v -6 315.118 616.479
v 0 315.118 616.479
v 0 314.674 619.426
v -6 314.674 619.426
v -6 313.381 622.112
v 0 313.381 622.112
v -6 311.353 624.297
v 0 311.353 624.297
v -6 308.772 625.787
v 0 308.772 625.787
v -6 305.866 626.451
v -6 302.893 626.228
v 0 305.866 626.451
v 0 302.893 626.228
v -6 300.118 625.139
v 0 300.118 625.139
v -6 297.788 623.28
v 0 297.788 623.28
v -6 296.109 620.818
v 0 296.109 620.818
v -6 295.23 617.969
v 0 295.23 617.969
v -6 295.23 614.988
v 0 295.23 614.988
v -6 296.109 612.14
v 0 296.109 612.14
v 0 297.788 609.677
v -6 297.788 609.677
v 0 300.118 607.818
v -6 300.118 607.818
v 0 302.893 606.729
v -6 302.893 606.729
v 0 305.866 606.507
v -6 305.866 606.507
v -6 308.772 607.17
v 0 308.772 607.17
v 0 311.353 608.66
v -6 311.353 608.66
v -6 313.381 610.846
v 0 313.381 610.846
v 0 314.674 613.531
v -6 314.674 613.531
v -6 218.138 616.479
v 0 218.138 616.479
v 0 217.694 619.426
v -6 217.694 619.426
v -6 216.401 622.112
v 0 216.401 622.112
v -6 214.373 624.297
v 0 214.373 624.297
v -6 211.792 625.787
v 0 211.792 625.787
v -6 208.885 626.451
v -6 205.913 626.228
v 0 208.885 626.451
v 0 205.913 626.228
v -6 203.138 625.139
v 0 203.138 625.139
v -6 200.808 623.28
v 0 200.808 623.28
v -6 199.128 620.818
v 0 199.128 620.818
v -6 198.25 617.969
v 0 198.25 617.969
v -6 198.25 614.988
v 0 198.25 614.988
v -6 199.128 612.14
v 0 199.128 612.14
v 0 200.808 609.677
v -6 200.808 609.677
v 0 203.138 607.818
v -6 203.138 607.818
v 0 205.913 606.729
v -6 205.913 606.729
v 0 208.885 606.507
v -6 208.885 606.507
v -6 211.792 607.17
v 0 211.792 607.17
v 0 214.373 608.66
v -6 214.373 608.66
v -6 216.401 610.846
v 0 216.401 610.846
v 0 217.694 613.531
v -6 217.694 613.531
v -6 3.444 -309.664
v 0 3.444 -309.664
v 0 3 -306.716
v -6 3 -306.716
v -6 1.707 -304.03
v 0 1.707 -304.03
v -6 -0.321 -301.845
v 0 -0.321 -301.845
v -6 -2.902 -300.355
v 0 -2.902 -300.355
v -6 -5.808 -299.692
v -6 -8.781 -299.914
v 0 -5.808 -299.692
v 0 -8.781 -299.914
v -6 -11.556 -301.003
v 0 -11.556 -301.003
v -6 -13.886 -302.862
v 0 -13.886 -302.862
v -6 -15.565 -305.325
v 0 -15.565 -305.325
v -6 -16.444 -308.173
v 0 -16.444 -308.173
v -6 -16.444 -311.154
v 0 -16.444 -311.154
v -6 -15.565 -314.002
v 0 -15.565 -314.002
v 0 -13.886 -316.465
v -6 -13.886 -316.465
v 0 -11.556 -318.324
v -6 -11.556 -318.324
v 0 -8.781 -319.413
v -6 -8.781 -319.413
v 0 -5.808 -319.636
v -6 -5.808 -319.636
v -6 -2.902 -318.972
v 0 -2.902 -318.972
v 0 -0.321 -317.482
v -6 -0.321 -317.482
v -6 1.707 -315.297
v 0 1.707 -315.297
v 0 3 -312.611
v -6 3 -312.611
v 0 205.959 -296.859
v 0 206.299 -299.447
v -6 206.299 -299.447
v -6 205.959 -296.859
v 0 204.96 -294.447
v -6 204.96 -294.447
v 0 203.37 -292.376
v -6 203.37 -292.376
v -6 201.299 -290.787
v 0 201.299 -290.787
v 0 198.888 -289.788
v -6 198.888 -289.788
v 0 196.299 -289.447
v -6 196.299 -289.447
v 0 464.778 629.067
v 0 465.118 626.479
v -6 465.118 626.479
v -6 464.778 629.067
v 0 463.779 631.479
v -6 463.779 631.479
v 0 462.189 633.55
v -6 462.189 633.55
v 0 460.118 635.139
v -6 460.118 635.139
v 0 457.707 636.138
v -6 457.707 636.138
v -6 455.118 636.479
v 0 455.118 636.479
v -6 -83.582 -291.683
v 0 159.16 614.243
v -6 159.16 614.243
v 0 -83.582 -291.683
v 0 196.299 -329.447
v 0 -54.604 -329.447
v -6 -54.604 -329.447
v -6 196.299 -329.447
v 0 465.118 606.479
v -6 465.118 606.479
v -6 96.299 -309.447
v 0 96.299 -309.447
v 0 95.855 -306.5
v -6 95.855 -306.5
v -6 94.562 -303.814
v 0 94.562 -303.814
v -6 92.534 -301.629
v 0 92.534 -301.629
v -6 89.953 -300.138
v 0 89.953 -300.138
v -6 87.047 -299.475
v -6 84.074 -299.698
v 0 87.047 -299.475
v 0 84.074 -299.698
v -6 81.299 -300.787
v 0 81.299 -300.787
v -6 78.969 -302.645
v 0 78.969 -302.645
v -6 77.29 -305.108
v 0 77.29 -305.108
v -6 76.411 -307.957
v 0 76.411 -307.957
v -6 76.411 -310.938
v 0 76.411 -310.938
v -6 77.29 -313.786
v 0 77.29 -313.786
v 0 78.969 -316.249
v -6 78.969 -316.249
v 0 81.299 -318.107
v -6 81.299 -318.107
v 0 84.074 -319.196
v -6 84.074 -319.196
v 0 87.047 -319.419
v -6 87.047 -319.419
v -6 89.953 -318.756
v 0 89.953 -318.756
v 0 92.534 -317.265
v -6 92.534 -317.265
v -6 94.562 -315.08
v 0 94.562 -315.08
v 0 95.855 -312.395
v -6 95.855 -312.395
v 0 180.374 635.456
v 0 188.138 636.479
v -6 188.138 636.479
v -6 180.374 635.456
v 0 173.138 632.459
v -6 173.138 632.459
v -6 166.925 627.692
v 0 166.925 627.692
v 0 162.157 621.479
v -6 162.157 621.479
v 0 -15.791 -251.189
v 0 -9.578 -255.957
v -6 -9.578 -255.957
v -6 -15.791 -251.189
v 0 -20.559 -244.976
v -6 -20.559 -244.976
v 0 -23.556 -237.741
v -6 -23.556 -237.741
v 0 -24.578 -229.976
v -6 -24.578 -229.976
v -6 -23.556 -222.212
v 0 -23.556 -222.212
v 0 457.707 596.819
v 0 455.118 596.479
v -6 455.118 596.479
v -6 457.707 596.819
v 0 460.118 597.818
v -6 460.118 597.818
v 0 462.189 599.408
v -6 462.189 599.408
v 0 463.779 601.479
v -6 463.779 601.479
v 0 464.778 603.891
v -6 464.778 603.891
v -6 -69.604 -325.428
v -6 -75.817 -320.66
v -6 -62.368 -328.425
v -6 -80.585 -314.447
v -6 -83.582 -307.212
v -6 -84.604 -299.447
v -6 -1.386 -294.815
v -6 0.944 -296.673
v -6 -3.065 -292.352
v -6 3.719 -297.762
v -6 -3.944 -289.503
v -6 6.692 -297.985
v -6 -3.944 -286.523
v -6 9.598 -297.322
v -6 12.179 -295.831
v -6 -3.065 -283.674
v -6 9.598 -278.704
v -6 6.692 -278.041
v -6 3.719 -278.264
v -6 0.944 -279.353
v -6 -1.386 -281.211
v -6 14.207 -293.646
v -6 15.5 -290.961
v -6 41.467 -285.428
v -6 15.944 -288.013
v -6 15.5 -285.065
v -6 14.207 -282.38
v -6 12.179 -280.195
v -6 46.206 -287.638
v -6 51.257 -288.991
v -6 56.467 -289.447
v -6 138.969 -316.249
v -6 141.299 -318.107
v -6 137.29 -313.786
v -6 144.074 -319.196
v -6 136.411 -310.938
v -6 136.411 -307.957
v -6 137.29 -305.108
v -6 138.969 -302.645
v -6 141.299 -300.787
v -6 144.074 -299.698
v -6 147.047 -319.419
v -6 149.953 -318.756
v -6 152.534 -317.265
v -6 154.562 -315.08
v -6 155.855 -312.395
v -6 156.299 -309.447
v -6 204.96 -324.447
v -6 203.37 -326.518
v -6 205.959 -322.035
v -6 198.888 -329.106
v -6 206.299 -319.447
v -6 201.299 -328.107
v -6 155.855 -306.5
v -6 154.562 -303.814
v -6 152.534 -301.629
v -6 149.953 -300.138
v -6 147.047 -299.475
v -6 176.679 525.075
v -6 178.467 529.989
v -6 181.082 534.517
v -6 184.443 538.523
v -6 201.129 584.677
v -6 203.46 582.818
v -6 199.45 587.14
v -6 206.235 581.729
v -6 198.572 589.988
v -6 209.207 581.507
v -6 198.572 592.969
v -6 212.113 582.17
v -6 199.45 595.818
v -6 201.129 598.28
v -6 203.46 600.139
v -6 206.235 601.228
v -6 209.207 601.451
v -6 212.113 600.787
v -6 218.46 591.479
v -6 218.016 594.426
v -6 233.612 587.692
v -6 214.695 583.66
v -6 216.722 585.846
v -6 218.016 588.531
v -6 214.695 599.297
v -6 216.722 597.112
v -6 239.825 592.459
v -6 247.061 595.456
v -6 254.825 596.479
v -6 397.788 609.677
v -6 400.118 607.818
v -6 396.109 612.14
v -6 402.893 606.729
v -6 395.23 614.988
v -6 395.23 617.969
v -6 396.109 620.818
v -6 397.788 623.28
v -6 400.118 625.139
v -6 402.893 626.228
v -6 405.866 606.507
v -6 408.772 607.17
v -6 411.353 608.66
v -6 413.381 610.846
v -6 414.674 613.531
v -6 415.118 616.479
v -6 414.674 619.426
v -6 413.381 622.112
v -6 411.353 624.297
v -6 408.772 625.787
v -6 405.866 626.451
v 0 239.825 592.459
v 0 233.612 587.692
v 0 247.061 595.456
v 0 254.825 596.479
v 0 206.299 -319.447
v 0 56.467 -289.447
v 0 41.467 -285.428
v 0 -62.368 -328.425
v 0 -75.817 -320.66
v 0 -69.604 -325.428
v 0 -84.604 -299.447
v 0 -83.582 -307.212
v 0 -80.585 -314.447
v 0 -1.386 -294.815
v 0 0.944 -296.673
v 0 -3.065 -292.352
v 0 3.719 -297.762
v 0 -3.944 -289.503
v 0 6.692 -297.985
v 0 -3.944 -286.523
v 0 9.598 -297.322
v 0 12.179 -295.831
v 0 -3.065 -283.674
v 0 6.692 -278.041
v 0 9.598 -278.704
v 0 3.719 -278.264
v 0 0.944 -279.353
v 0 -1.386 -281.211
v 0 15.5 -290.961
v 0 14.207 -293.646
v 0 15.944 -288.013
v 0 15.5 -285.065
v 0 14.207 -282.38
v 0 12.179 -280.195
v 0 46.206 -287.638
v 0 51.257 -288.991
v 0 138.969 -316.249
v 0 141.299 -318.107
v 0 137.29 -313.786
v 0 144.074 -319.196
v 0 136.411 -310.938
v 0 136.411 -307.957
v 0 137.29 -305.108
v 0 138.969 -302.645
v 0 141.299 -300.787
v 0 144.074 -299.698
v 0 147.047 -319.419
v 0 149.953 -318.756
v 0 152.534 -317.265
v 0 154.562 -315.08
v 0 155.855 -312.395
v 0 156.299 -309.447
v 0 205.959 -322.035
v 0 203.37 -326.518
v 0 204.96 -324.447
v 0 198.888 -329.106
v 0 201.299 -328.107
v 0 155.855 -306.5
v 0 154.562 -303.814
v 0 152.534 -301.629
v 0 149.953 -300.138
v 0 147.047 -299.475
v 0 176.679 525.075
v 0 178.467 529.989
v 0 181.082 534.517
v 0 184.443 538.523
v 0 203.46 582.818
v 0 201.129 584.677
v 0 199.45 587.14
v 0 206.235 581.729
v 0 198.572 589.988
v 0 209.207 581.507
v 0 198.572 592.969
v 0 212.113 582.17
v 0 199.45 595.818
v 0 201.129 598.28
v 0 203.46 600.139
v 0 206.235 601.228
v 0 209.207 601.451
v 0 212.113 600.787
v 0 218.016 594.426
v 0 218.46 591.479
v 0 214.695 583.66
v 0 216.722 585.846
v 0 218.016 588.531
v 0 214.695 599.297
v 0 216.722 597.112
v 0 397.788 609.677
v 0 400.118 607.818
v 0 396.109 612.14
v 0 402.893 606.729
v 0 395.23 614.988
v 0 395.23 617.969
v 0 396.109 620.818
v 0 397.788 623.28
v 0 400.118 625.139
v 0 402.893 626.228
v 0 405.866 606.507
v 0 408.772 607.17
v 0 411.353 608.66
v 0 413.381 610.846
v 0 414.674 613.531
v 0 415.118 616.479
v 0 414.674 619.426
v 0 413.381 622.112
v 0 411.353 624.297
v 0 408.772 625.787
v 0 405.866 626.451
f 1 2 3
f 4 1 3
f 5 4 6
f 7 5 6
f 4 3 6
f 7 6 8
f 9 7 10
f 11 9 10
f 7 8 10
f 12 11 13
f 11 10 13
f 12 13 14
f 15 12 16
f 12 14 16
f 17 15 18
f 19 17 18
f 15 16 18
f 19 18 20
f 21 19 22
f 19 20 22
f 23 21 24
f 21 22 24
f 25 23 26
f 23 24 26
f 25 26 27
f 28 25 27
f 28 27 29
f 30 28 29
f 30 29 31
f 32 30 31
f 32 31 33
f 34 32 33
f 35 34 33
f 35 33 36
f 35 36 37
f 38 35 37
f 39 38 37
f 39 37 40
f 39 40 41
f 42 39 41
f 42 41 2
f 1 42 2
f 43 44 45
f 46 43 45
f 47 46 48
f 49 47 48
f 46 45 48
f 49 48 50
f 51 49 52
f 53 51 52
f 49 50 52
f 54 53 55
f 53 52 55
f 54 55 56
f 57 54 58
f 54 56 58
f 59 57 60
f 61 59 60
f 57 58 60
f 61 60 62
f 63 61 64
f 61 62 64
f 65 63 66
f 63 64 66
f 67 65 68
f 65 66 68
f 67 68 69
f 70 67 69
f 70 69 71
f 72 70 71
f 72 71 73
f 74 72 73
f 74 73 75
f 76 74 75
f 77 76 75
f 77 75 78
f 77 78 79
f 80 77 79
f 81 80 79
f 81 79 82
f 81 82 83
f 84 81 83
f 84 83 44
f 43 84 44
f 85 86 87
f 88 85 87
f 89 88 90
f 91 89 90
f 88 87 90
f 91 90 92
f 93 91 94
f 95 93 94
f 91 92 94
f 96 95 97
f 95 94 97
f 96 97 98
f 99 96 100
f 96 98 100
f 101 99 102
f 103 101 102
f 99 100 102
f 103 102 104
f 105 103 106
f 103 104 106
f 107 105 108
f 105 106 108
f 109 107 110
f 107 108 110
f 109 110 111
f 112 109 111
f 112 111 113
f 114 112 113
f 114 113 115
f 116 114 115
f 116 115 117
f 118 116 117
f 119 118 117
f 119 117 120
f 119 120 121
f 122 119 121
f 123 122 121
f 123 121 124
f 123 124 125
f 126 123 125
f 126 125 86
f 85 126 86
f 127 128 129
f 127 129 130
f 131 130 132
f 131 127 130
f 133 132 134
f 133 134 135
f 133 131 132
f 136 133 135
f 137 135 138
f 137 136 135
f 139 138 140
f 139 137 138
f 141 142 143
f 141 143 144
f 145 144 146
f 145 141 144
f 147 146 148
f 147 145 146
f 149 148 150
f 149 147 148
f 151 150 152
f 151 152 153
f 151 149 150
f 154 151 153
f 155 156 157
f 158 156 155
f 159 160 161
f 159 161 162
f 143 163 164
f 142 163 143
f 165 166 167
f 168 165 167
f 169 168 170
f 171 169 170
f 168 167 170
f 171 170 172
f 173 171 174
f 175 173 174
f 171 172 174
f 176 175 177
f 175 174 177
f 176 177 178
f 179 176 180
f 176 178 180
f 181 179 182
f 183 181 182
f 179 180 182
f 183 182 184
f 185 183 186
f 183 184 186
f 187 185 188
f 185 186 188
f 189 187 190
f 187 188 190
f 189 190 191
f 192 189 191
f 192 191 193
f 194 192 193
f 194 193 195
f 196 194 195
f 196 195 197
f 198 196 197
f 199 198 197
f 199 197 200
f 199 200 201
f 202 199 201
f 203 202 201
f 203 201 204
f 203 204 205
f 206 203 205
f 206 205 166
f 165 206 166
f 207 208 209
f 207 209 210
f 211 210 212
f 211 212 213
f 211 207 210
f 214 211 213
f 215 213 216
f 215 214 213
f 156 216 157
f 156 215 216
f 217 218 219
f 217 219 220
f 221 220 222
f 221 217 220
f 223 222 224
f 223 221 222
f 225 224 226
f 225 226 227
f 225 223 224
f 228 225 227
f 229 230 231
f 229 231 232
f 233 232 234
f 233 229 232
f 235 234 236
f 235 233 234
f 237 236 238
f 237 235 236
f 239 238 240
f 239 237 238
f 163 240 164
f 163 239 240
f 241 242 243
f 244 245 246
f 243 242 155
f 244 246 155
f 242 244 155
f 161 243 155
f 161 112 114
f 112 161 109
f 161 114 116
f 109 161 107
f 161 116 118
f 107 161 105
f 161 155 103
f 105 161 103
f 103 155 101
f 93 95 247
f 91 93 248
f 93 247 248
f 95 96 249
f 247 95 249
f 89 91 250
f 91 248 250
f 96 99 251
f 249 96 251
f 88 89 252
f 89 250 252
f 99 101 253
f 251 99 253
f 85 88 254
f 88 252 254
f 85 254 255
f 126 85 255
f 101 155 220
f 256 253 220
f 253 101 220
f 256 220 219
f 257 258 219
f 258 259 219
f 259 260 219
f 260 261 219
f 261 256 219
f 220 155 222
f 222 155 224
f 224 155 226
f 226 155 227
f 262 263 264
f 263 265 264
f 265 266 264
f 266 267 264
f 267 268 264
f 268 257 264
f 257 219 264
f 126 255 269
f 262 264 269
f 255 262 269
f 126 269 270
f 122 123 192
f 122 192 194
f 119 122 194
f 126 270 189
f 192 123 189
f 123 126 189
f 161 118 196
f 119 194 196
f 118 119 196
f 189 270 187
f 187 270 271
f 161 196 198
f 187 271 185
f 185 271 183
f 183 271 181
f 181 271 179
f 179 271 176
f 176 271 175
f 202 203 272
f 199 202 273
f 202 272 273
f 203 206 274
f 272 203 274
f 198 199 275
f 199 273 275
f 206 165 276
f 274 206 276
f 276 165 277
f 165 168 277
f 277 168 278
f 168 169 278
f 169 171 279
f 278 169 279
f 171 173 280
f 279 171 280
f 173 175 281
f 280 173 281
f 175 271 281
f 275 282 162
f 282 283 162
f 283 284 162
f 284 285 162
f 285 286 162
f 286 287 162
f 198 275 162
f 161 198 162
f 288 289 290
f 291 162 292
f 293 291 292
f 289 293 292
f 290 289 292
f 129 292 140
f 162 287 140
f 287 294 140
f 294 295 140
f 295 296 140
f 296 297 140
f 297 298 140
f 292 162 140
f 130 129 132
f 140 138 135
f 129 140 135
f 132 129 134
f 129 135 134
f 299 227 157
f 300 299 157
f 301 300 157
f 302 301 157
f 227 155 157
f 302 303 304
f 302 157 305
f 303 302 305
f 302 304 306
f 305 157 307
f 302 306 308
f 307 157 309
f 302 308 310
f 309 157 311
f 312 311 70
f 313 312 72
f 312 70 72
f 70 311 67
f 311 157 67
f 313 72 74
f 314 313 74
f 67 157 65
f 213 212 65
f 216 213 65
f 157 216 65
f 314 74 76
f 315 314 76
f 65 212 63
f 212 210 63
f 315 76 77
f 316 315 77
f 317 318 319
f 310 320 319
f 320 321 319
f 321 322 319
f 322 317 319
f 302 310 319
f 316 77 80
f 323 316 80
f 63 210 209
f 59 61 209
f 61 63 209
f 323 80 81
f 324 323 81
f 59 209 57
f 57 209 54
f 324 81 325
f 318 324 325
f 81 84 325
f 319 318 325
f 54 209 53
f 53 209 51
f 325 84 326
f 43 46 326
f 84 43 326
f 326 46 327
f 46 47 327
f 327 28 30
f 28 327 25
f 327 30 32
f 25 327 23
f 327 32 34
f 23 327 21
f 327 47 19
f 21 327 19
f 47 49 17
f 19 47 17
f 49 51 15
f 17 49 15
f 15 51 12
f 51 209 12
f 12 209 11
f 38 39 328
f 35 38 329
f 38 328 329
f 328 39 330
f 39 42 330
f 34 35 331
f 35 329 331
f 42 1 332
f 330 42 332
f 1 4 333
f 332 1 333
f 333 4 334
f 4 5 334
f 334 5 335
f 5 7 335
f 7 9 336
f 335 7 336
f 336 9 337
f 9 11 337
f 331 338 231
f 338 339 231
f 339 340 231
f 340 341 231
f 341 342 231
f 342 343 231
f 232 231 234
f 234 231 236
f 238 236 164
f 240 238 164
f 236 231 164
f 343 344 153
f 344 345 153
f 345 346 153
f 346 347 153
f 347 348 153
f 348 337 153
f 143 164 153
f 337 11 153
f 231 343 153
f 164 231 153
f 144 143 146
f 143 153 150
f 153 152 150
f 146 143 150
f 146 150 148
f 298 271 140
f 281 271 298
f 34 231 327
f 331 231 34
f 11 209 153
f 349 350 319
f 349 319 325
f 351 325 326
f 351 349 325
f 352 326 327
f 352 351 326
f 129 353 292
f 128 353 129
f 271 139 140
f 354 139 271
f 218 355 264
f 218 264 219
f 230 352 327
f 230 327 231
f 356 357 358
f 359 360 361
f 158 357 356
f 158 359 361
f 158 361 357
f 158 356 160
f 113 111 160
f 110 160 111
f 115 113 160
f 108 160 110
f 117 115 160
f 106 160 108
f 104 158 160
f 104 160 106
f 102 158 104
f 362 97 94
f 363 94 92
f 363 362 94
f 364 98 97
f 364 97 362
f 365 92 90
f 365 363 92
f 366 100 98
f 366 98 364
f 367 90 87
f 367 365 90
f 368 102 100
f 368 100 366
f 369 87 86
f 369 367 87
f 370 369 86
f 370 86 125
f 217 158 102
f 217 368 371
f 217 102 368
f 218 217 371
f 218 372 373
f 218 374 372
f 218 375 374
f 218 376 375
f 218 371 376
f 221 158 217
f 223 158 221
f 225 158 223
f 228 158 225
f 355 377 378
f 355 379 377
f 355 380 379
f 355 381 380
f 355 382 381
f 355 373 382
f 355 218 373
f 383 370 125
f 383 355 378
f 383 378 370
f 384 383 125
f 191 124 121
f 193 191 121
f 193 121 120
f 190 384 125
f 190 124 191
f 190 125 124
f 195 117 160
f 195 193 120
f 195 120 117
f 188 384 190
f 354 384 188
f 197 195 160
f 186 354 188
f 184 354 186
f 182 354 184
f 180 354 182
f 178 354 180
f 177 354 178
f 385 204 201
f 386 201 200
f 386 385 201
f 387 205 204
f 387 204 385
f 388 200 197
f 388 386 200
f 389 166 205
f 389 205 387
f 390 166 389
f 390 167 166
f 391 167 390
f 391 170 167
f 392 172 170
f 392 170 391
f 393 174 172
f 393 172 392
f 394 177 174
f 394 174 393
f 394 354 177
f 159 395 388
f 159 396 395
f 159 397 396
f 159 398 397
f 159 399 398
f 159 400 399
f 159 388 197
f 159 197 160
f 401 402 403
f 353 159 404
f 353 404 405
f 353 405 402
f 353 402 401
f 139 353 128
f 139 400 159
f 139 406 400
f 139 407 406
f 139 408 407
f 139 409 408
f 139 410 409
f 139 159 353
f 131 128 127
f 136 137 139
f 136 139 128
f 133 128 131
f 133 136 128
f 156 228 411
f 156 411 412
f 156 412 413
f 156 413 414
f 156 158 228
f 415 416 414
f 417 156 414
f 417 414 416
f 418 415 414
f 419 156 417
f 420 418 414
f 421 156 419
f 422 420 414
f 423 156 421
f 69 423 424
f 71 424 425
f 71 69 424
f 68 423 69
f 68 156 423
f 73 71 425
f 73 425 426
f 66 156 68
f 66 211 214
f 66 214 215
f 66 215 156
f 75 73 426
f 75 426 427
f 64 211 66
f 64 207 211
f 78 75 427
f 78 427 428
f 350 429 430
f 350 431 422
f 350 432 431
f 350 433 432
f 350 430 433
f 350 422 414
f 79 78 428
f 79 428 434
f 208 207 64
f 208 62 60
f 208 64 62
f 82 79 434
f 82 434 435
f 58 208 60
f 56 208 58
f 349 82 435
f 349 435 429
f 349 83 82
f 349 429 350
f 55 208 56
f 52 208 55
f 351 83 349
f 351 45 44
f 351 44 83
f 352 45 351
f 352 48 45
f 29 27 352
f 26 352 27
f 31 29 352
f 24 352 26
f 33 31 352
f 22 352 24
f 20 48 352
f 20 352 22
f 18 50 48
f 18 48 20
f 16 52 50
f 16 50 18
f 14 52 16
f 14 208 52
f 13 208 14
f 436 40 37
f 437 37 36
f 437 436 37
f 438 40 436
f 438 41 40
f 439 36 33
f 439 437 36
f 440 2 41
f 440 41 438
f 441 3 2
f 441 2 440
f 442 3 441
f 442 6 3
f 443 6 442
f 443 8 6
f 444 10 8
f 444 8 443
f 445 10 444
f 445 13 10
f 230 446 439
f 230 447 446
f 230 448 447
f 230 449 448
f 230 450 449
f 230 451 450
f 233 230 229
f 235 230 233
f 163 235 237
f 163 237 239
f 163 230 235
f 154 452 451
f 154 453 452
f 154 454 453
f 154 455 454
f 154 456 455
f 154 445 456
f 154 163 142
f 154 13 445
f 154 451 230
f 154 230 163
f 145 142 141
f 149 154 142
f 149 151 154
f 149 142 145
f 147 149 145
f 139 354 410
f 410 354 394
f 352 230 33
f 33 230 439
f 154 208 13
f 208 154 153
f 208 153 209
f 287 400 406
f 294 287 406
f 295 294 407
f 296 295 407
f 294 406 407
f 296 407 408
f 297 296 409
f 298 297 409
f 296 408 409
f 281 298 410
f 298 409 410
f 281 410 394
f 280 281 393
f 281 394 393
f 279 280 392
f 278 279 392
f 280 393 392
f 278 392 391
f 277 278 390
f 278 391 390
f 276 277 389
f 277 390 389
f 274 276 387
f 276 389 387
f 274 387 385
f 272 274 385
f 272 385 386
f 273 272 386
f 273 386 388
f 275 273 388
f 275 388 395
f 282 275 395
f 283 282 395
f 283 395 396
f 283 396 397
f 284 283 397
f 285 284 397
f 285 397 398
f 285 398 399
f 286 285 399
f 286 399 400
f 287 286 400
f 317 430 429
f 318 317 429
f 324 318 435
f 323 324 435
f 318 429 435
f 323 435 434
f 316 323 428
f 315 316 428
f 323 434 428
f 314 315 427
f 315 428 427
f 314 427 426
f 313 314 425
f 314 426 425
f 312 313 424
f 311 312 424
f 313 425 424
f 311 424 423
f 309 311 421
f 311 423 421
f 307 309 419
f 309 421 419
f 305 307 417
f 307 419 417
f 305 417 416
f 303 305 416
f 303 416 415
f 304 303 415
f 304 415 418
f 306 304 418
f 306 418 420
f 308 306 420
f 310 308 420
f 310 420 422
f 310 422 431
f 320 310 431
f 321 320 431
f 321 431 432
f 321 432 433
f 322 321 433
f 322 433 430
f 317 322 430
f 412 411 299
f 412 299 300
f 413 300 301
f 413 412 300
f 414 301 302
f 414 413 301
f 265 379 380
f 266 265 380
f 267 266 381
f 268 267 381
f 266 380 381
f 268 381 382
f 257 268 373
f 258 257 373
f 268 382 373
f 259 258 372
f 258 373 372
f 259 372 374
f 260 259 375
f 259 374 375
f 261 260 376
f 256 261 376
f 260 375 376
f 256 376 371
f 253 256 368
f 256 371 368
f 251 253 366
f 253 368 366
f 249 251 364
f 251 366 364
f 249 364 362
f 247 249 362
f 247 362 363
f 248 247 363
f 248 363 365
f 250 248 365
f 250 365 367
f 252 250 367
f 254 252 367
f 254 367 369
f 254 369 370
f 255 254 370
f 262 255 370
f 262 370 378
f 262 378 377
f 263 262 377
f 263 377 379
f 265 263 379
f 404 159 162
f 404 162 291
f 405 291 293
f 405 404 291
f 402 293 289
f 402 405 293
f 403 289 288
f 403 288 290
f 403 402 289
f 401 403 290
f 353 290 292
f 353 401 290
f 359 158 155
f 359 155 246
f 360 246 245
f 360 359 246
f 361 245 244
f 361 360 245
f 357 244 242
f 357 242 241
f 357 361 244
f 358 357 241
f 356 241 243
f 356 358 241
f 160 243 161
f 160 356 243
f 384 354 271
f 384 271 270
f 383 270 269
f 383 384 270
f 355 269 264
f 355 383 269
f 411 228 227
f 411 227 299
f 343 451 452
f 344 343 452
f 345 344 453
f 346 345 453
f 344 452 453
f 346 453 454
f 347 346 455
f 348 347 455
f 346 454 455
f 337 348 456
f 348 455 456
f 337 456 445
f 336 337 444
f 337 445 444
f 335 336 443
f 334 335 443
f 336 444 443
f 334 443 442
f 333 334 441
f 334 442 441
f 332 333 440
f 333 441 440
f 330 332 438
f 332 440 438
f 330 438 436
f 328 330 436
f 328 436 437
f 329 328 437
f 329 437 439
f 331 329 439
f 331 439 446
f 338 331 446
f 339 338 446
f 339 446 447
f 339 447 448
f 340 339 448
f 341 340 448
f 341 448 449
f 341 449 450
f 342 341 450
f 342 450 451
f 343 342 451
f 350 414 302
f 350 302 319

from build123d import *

# Parameters (mm, degrees)
F2_DEPTH = 6
F1_R     = 10
F3_DEPTH = 6.001
F4_R     = 10
F5_DEPTH = 6.001


with BuildPart() as f2:
    # F0 (on Right) → F2 (new body)
    with BuildSketch(Plane.YZ):
        with BuildLine():
            Line((-54.603913, -329.447112), (196.299325, -329.447112))
            ThreePointArc((196.299325, -329.447112), (203.370393, -326.51818), (206.299325, -319.447112))
            Line((206.299325, -319.447112), (206.299325, -299.447112))
            ThreePointArc((206.299325, -299.447112), (203.370393, -292.376044), (196.299325, -289.447112))
            Line((196.299325, -289.447112), (56.466816, -289.447112))
            ThreePointArc((56.466816, -289.447112), (48.702245, -288.424887), (41.466816, -285.427874))
            Line((41.466816, -285.427874), (-9.578206, -255.957017))
            ThreePointArc((-9.578206, -255.957017), (-22.294592, -241.456758), (-23.555981, -222.211683))
            Line((-23.555981, -222.211683), (176.678757, 525.074533))
            ThreePointArc((176.678757, 525.074533), (179.67577, 532.309961), (184.443329, 538.523165))
            Line((184.443329, 538.523165), (233.612082, 587.691918))
            ThreePointArc((233.612082, 587.691918), (243.344782, 594.1951), (254.825285, 596.478714))
            Line((254.825285, 596.478714), (455.118371, 596.478714))
            ThreePointArc((455.118371, 596.478714), (462.189438, 599.407646), (465.118371, 606.478714))
            Line((465.118371, 606.478714), (465.118371, 626.478714))
            ThreePointArc((465.118371, 626.478714), (462.189438, 633.549782), (455.118371, 636.478714))
            Line((455.118371, 636.478714), (188.13818, 636.478714))
            ThreePointArc((188.13818, 636.478714), (169.875337, 630.279314), (159.160405, 614.243286))
            Line((159.160405, 614.243286), (-83.581688, -291.682541))
            ThreePointArc((-83.581688, -291.682541), (-78.404514, -317.709955), (-54.603913, -329.447112))
        make_face()
    extrude(amount=-F2_DEPTH)

    # F1 (on face) → F3 (cut, through all)
    with BuildSketch(Plane.YZ):
        with Locations((405.118371, 616.478714)):
            Circle(F1_R)
        with Locations((305.118371, 616.478714)):
            Circle(F1_R)
        with Locations((146.299325, -309.447112)):
            Circle(F1_R)
        with Locations((86.299325, -309.447112)):
            Circle(F1_R)
    extrude(amount=-F3_DEPTH, mode=Mode.SUBTRACT)

    # F4 (on face) → F5 (cut, through all)
    with BuildSketch(Plane.YZ):
        with Locations((208.13818, 616.478714)):
            Circle(F4_R)
        with Locations((208.459967, 591.478714)):
            Circle(F4_R)
        with Locations((5.944305, -288.012954)):
            Circle(F4_R)
        with Locations((-6.555695, -309.663589)):
            Circle(F4_R)
    extrude(amount=-F5_DEPTH, mode=Mode.SUBTRACT)


solid = f2.part
